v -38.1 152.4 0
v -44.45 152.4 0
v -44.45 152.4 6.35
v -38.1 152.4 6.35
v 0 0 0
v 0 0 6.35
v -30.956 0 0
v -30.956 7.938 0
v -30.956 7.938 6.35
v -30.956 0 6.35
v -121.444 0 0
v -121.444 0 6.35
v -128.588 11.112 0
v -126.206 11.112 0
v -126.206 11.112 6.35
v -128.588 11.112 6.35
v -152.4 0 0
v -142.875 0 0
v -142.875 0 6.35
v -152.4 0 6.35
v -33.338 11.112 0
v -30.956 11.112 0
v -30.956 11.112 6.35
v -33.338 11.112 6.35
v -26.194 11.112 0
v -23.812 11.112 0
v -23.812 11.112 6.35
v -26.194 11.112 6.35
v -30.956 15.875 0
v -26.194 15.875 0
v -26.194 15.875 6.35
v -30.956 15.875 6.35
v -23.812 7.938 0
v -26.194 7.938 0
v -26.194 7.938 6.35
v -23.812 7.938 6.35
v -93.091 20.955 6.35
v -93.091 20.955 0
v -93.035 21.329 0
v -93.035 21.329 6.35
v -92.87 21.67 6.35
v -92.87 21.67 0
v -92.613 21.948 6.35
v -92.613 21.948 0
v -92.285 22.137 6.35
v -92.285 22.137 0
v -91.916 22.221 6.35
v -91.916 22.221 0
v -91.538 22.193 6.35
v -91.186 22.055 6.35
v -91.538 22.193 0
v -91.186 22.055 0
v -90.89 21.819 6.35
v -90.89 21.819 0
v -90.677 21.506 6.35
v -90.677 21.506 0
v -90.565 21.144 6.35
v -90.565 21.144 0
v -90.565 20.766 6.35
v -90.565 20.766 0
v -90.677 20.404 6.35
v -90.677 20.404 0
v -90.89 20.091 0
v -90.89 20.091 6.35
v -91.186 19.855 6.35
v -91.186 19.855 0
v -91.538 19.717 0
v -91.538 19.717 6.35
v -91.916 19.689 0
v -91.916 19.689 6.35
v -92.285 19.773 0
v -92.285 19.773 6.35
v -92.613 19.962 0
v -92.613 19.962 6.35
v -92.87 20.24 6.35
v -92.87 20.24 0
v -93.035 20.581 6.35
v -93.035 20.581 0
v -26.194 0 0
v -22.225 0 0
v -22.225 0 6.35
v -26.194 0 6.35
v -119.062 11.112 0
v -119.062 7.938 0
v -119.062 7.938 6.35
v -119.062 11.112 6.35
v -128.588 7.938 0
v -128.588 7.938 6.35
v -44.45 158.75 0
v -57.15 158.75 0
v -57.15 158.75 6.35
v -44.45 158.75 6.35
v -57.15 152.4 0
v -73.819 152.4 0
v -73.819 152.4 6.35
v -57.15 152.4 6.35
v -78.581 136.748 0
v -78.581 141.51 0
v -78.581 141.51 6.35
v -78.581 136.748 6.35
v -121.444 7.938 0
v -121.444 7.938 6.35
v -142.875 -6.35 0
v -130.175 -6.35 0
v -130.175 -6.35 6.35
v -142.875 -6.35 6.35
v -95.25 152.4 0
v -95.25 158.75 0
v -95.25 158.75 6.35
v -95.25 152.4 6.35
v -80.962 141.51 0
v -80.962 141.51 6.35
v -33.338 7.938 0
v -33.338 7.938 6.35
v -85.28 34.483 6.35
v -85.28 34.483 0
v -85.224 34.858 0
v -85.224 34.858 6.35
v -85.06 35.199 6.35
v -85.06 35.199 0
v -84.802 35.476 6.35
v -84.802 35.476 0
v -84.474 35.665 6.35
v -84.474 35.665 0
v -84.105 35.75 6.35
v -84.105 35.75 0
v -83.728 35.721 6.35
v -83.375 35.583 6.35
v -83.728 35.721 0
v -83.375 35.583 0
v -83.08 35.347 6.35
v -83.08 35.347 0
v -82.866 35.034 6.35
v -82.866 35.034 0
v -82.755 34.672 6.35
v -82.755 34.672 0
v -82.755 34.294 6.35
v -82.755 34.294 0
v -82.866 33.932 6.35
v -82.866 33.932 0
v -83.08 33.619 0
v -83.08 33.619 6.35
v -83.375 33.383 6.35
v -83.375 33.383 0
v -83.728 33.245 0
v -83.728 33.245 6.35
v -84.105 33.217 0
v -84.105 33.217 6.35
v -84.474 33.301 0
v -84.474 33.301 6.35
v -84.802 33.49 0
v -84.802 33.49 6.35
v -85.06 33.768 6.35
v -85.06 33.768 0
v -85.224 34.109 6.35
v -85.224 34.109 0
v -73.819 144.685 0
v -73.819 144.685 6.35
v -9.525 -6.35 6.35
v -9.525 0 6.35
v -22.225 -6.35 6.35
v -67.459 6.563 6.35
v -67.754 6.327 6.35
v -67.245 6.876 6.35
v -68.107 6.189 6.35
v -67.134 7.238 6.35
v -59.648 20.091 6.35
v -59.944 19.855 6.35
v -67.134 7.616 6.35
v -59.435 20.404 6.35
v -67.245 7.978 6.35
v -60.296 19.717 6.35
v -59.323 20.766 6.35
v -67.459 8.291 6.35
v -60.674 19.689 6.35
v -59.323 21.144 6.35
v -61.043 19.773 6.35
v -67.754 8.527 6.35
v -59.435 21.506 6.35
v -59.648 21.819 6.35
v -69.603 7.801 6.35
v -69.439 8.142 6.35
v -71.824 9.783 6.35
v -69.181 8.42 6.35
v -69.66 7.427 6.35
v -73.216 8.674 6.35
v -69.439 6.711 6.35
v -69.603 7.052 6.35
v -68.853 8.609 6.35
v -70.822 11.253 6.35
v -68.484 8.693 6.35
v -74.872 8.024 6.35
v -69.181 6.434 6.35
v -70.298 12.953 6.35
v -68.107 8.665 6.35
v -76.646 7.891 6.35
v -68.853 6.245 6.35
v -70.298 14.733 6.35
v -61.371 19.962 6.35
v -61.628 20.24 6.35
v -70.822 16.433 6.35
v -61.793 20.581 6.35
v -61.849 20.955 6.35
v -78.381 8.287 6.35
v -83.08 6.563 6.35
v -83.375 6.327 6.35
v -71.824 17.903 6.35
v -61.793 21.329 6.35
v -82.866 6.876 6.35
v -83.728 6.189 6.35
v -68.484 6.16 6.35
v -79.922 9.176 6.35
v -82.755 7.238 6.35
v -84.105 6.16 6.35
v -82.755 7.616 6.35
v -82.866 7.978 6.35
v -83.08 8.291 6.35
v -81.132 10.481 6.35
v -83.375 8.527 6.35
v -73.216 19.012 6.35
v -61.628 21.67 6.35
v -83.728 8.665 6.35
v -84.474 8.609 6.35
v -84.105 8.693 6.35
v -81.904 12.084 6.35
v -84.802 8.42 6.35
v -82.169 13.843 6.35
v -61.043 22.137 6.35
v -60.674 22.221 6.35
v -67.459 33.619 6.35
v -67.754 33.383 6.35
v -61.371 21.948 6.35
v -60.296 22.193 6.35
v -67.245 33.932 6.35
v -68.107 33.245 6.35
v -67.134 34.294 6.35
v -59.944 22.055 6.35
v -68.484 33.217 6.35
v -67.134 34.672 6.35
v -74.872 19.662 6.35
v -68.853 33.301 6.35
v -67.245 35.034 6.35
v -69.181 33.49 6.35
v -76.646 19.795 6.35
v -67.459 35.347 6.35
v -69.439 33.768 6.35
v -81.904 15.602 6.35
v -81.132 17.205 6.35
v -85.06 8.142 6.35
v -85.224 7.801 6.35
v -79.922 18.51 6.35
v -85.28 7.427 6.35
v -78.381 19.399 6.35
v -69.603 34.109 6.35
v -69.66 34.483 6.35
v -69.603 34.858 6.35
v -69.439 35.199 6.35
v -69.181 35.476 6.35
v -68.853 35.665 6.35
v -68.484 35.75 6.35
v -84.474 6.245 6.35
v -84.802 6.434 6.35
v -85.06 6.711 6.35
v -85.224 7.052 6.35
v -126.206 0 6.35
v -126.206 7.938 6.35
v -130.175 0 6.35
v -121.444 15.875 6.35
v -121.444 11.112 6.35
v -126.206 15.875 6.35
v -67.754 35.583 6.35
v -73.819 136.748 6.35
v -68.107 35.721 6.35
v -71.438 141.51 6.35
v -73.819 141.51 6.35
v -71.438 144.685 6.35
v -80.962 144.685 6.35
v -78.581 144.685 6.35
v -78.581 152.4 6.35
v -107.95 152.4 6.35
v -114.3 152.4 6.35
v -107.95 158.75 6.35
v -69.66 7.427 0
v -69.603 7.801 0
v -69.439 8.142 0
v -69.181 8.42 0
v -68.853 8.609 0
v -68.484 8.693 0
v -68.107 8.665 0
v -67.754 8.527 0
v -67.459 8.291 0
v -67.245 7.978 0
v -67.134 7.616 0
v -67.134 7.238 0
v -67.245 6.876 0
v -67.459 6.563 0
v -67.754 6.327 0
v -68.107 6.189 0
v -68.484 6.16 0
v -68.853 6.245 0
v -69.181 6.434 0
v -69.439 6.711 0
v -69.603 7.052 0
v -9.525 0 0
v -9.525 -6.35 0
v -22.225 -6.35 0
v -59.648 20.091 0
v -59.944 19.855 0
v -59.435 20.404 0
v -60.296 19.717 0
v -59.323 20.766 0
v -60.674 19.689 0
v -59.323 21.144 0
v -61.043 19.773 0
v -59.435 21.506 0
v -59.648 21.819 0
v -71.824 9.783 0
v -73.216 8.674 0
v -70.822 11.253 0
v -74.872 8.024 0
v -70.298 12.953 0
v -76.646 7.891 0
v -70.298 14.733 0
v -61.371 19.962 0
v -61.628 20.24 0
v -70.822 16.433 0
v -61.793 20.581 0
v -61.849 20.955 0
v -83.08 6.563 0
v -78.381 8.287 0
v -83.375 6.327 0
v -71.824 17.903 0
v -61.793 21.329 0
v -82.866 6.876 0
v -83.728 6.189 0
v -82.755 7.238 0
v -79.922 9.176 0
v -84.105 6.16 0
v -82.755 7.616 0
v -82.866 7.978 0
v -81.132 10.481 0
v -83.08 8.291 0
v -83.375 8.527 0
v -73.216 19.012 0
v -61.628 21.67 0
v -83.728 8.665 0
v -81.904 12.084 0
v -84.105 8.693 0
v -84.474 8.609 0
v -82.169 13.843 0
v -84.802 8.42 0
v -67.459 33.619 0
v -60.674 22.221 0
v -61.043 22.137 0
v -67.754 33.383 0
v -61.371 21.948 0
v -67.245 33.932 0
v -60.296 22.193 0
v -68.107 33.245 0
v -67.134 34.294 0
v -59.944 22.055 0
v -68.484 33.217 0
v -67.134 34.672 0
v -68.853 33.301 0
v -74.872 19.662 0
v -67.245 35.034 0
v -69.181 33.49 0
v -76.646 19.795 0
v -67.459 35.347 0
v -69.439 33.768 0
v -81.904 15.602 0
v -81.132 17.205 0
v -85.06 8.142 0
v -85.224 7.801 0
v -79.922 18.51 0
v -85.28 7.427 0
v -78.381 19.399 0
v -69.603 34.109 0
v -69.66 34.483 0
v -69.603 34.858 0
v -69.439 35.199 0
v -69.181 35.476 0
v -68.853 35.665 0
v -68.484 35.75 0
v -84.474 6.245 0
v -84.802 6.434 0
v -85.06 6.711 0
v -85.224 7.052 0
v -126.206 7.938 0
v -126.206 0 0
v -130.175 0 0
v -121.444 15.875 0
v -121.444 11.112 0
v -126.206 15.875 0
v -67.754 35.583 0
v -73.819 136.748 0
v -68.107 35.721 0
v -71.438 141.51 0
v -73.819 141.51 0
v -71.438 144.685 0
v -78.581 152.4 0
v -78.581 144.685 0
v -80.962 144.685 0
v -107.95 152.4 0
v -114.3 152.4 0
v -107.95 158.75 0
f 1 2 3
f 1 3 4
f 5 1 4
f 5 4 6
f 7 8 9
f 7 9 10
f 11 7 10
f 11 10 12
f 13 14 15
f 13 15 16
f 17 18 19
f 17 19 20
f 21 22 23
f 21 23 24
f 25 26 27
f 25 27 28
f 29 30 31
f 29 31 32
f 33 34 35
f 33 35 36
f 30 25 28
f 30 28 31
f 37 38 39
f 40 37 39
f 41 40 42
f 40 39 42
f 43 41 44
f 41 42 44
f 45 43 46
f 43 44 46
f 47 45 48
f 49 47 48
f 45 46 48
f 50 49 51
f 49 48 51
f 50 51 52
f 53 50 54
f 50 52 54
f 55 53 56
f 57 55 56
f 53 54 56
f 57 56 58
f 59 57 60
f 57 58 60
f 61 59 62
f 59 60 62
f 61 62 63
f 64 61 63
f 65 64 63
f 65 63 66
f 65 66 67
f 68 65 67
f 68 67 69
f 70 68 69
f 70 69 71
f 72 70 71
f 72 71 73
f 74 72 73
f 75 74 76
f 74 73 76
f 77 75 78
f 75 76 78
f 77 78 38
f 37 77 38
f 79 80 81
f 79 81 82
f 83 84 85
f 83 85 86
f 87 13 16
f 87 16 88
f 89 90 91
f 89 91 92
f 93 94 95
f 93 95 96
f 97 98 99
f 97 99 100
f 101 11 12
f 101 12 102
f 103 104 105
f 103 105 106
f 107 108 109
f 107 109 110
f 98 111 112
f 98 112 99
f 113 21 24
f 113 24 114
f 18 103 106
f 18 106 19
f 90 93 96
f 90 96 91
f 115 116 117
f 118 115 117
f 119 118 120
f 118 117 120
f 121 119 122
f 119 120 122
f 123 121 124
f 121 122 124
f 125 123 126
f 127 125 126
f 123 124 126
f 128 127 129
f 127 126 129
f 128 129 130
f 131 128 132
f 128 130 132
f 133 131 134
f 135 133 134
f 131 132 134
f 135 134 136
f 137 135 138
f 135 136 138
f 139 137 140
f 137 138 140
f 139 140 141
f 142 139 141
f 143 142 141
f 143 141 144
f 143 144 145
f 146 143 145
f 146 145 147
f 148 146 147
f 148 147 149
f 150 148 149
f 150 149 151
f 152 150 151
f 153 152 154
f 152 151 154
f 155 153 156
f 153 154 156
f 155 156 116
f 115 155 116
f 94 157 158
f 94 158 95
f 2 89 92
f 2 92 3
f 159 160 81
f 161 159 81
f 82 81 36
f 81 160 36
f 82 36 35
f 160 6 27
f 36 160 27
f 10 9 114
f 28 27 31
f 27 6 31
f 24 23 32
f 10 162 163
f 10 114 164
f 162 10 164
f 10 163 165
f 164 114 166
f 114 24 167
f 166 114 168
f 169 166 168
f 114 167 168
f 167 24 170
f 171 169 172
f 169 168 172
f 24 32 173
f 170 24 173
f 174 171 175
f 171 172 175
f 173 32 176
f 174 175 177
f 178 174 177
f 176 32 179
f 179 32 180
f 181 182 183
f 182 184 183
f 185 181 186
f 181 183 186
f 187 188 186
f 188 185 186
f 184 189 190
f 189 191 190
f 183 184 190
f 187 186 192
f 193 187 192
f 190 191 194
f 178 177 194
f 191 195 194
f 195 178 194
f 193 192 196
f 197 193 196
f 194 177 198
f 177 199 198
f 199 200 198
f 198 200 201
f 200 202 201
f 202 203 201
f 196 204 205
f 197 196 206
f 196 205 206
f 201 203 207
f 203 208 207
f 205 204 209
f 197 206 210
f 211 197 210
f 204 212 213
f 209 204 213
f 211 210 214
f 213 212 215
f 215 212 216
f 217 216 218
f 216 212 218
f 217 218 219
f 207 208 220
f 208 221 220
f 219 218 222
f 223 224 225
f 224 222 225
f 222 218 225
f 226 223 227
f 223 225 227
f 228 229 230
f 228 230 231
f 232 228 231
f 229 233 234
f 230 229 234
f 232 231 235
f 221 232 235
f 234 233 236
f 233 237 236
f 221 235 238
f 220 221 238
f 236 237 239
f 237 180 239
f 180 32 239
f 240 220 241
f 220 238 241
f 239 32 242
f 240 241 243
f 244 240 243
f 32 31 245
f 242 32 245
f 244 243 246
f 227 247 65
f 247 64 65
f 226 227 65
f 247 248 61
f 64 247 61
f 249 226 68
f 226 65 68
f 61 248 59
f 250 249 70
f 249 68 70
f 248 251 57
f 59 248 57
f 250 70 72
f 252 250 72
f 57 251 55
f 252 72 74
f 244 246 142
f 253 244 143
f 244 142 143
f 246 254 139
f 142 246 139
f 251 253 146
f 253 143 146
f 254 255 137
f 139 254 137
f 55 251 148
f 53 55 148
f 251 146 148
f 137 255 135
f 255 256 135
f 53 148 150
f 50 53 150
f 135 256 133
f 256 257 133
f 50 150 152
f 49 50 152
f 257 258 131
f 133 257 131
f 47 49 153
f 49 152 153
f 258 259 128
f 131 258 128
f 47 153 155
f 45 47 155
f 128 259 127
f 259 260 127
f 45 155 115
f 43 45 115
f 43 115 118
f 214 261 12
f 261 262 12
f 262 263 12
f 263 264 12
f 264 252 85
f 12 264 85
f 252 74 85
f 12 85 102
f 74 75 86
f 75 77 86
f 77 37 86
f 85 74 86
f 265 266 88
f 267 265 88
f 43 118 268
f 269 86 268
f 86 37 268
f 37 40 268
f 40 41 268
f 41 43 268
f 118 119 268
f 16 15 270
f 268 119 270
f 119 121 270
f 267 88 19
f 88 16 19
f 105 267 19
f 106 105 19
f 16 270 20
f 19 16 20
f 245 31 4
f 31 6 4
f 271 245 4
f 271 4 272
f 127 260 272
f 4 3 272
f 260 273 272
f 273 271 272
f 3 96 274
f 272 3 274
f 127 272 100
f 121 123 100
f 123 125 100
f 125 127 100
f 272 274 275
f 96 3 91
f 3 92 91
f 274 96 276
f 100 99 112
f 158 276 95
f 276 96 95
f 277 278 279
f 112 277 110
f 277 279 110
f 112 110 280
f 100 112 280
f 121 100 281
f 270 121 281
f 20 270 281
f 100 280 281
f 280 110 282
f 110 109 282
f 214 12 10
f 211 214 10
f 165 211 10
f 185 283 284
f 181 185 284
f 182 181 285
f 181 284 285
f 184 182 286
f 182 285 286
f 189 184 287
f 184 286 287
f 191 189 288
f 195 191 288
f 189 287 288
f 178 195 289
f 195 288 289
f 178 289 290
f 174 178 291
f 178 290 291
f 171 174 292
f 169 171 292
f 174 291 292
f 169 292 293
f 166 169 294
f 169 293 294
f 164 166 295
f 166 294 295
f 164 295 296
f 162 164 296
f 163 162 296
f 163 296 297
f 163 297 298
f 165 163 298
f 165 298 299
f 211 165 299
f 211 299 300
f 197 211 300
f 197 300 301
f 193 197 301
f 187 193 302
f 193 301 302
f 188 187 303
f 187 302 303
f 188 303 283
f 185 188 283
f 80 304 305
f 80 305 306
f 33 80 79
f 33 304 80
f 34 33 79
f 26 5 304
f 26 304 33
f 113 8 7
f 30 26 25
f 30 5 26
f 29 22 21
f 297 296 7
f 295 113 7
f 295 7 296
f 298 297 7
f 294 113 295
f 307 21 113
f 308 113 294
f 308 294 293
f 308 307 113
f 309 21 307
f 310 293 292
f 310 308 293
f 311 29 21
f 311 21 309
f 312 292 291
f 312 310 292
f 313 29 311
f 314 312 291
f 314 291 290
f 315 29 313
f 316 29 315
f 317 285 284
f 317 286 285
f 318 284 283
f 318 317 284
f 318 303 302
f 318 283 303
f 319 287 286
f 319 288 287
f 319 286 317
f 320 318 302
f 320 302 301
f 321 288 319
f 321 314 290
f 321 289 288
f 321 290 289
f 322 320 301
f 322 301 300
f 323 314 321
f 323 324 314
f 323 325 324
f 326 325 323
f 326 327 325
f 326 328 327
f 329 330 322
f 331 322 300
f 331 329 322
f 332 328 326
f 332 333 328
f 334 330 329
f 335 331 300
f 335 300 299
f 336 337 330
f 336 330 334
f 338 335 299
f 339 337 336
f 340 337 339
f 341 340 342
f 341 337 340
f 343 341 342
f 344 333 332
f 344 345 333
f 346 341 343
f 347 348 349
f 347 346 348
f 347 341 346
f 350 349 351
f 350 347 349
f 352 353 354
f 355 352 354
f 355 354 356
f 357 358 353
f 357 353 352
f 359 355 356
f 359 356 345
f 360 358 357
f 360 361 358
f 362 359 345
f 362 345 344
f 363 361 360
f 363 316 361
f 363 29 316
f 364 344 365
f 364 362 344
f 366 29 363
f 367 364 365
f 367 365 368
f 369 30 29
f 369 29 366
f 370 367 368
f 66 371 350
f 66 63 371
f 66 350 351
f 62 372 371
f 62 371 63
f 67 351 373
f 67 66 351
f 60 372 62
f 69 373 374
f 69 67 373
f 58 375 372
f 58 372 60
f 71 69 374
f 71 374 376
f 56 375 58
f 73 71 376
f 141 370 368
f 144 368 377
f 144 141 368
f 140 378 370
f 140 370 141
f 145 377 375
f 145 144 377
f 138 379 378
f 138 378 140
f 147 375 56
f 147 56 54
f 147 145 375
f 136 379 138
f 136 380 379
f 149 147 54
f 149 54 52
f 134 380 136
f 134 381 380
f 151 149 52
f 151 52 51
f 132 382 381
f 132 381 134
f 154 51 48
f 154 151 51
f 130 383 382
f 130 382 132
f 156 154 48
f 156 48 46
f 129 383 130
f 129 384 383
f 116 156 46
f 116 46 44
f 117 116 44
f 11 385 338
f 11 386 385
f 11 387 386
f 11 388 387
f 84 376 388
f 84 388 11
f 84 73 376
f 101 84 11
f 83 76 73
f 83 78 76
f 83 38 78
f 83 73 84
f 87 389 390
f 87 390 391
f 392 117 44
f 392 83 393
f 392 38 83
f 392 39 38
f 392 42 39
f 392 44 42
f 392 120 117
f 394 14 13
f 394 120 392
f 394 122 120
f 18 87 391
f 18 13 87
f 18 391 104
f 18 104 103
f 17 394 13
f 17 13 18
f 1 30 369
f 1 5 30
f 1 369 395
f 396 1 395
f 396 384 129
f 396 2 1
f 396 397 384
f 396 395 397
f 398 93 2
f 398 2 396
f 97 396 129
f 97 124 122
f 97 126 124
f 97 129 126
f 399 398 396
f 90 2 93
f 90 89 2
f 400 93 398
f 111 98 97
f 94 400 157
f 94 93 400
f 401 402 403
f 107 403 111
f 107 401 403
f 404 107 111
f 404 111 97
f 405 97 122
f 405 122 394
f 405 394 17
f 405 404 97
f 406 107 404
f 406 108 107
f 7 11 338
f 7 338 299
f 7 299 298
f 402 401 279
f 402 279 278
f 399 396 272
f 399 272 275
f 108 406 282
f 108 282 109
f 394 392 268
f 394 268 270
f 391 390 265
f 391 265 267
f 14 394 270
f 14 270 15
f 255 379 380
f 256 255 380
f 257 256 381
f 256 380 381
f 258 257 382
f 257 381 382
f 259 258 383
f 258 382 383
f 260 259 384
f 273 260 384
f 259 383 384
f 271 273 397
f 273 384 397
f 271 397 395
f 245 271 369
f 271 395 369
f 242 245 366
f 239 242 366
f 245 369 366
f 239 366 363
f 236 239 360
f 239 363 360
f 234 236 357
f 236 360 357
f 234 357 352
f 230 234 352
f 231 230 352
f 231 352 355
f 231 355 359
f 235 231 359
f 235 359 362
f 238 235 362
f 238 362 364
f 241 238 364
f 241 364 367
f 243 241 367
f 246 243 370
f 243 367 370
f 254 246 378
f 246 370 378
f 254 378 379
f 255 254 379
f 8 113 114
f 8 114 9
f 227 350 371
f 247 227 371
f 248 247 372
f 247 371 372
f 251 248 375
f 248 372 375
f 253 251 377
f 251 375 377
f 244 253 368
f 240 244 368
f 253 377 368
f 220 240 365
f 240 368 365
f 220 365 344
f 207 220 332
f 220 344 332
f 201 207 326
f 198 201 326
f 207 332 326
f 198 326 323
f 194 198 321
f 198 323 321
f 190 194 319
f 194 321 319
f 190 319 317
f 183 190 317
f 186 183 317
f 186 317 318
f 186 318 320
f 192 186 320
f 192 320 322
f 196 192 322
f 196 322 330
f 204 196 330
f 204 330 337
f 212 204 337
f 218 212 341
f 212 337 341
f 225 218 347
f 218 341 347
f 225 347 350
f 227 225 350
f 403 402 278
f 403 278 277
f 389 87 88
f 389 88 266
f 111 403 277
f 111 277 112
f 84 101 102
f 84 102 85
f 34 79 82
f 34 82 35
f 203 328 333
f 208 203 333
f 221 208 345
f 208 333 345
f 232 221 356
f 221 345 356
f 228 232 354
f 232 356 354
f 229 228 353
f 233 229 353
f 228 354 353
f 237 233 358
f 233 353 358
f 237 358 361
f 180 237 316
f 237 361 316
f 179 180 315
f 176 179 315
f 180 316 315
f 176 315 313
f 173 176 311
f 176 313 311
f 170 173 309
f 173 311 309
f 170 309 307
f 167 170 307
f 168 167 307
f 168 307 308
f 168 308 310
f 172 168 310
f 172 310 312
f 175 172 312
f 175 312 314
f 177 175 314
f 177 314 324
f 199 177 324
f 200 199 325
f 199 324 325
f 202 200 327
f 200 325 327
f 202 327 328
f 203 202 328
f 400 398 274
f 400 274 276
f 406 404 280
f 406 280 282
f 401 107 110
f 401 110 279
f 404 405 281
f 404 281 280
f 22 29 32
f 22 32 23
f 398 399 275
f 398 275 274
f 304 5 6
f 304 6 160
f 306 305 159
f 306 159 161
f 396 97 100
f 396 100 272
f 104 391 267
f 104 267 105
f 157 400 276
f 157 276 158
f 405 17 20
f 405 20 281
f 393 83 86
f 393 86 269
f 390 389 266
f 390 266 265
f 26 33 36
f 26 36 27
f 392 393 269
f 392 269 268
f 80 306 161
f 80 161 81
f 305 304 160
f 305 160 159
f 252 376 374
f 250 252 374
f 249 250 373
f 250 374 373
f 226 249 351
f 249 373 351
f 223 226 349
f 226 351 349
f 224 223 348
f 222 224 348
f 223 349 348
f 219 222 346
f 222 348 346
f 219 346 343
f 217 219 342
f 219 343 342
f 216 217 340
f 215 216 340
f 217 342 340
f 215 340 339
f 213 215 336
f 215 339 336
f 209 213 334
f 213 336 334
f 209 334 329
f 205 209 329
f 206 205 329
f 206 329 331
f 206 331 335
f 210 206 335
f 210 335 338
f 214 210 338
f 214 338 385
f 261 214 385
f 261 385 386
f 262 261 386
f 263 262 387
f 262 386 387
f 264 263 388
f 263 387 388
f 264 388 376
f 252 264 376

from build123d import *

# Parameters (mm, degrees)
BOSS_EXTRUDE1_DEPTH = 6.35
SKETCH4_R           = 5.969
SKETCH4_R_2         = 1.27
CUT_EXTRUDE3_DEPTH  = 6.35


with BuildPart() as part:
    # Sketch2 → Boss-Extrude1 (new body)
    with BuildSketch(Plane.XY):
        Polygon((0, 0), (-9.525, 0), (-9.525, -6.35), (-22.225, -6.35), (-22.225, 0), (-26.19375, 0), (-26.19375, 7.9375), (-23.8125, 7.9375), (-23.8125, 11.1125), (-26.19375, 11.1125), (-26.19375, 15.875), (-30.95625, 15.875), (-30.95625, 11.1125), (-33.3375, 11.1125), (-33.3375, 7.9375), (-30.95625, 7.9375), (-30.95625, 0), (-121.44375, 0), (-121.44375, 7.9375), (-119.0625, 7.9375), (-119.0625, 11.1125), (-121.44375, 11.1125), (-121.44375, 15.875), (-126.20625, 15.875), (-126.20625, 11.1125), (-128.5875, 11.1125), (-128.5875, 7.9375), (-126.20625, 7.9375), (-126.20625, 0), (-130.175, 0), (-130.175, -6.35), (-142.875, -6.35), (-142.875, 0), (-152.4, 0), (-114.3, 152.4), (-107.95, 152.4), (-107.95, 158.75), (-95.25, 158.75), (-95.25, 152.4), (-78.58125, 152.4), (-78.58125, 144.685169992), (-80.9625, 144.685169992), (-80.9625, 141.510169992), (-78.58125, 141.510169992), (-78.58125, 136.747669992), (-73.81875, 136.747669992), (-73.81875, 141.510169992), (-71.4375, 141.510169992), (-71.4375, 144.685169992), (-73.81875, 144.685169992), (-73.81875, 152.4), (-57.15, 152.4), (-57.15, 158.75), (-44.45, 158.75), (-44.45, 152.4), (-38.1, 152.4), align=None)
    extrude(amount=BOSS_EXTRUDE1_DEPTH)

    # Sketch4 → Cut-Extrude3 (cut)
    with BuildSketch(Plane(origin=(0, 0, 0), x_dir=(-1, 0, 0), z_dir=(0, 0, -1))):
        with Locations((76.2, 13.843)):
            Circle(SKETCH4_R)
        with Locations((68.3895, 34.483182833)):
            Circle(SKETCH4_R_2)
        with Locations((84.0105, 34.483182833)):
            Circle(SKETCH4_R_2)
        with Locations((91.821, 20.955)):
            Circle(SKETCH4_R_2)
        with Locations((84.0105, 7.426817167)):
            Circle(SKETCH4_R_2)
        with Locations((68.3895, 7.426817167)):
            Circle(SKETCH4_R_2)
        with Locations((60.579, 20.955)):
            Circle(SKETCH4_R_2)
    extrude(amount=-CUT_EXTRUDE3_DEPTH, mode=Mode.SUBTRACT)


solid = part.part
